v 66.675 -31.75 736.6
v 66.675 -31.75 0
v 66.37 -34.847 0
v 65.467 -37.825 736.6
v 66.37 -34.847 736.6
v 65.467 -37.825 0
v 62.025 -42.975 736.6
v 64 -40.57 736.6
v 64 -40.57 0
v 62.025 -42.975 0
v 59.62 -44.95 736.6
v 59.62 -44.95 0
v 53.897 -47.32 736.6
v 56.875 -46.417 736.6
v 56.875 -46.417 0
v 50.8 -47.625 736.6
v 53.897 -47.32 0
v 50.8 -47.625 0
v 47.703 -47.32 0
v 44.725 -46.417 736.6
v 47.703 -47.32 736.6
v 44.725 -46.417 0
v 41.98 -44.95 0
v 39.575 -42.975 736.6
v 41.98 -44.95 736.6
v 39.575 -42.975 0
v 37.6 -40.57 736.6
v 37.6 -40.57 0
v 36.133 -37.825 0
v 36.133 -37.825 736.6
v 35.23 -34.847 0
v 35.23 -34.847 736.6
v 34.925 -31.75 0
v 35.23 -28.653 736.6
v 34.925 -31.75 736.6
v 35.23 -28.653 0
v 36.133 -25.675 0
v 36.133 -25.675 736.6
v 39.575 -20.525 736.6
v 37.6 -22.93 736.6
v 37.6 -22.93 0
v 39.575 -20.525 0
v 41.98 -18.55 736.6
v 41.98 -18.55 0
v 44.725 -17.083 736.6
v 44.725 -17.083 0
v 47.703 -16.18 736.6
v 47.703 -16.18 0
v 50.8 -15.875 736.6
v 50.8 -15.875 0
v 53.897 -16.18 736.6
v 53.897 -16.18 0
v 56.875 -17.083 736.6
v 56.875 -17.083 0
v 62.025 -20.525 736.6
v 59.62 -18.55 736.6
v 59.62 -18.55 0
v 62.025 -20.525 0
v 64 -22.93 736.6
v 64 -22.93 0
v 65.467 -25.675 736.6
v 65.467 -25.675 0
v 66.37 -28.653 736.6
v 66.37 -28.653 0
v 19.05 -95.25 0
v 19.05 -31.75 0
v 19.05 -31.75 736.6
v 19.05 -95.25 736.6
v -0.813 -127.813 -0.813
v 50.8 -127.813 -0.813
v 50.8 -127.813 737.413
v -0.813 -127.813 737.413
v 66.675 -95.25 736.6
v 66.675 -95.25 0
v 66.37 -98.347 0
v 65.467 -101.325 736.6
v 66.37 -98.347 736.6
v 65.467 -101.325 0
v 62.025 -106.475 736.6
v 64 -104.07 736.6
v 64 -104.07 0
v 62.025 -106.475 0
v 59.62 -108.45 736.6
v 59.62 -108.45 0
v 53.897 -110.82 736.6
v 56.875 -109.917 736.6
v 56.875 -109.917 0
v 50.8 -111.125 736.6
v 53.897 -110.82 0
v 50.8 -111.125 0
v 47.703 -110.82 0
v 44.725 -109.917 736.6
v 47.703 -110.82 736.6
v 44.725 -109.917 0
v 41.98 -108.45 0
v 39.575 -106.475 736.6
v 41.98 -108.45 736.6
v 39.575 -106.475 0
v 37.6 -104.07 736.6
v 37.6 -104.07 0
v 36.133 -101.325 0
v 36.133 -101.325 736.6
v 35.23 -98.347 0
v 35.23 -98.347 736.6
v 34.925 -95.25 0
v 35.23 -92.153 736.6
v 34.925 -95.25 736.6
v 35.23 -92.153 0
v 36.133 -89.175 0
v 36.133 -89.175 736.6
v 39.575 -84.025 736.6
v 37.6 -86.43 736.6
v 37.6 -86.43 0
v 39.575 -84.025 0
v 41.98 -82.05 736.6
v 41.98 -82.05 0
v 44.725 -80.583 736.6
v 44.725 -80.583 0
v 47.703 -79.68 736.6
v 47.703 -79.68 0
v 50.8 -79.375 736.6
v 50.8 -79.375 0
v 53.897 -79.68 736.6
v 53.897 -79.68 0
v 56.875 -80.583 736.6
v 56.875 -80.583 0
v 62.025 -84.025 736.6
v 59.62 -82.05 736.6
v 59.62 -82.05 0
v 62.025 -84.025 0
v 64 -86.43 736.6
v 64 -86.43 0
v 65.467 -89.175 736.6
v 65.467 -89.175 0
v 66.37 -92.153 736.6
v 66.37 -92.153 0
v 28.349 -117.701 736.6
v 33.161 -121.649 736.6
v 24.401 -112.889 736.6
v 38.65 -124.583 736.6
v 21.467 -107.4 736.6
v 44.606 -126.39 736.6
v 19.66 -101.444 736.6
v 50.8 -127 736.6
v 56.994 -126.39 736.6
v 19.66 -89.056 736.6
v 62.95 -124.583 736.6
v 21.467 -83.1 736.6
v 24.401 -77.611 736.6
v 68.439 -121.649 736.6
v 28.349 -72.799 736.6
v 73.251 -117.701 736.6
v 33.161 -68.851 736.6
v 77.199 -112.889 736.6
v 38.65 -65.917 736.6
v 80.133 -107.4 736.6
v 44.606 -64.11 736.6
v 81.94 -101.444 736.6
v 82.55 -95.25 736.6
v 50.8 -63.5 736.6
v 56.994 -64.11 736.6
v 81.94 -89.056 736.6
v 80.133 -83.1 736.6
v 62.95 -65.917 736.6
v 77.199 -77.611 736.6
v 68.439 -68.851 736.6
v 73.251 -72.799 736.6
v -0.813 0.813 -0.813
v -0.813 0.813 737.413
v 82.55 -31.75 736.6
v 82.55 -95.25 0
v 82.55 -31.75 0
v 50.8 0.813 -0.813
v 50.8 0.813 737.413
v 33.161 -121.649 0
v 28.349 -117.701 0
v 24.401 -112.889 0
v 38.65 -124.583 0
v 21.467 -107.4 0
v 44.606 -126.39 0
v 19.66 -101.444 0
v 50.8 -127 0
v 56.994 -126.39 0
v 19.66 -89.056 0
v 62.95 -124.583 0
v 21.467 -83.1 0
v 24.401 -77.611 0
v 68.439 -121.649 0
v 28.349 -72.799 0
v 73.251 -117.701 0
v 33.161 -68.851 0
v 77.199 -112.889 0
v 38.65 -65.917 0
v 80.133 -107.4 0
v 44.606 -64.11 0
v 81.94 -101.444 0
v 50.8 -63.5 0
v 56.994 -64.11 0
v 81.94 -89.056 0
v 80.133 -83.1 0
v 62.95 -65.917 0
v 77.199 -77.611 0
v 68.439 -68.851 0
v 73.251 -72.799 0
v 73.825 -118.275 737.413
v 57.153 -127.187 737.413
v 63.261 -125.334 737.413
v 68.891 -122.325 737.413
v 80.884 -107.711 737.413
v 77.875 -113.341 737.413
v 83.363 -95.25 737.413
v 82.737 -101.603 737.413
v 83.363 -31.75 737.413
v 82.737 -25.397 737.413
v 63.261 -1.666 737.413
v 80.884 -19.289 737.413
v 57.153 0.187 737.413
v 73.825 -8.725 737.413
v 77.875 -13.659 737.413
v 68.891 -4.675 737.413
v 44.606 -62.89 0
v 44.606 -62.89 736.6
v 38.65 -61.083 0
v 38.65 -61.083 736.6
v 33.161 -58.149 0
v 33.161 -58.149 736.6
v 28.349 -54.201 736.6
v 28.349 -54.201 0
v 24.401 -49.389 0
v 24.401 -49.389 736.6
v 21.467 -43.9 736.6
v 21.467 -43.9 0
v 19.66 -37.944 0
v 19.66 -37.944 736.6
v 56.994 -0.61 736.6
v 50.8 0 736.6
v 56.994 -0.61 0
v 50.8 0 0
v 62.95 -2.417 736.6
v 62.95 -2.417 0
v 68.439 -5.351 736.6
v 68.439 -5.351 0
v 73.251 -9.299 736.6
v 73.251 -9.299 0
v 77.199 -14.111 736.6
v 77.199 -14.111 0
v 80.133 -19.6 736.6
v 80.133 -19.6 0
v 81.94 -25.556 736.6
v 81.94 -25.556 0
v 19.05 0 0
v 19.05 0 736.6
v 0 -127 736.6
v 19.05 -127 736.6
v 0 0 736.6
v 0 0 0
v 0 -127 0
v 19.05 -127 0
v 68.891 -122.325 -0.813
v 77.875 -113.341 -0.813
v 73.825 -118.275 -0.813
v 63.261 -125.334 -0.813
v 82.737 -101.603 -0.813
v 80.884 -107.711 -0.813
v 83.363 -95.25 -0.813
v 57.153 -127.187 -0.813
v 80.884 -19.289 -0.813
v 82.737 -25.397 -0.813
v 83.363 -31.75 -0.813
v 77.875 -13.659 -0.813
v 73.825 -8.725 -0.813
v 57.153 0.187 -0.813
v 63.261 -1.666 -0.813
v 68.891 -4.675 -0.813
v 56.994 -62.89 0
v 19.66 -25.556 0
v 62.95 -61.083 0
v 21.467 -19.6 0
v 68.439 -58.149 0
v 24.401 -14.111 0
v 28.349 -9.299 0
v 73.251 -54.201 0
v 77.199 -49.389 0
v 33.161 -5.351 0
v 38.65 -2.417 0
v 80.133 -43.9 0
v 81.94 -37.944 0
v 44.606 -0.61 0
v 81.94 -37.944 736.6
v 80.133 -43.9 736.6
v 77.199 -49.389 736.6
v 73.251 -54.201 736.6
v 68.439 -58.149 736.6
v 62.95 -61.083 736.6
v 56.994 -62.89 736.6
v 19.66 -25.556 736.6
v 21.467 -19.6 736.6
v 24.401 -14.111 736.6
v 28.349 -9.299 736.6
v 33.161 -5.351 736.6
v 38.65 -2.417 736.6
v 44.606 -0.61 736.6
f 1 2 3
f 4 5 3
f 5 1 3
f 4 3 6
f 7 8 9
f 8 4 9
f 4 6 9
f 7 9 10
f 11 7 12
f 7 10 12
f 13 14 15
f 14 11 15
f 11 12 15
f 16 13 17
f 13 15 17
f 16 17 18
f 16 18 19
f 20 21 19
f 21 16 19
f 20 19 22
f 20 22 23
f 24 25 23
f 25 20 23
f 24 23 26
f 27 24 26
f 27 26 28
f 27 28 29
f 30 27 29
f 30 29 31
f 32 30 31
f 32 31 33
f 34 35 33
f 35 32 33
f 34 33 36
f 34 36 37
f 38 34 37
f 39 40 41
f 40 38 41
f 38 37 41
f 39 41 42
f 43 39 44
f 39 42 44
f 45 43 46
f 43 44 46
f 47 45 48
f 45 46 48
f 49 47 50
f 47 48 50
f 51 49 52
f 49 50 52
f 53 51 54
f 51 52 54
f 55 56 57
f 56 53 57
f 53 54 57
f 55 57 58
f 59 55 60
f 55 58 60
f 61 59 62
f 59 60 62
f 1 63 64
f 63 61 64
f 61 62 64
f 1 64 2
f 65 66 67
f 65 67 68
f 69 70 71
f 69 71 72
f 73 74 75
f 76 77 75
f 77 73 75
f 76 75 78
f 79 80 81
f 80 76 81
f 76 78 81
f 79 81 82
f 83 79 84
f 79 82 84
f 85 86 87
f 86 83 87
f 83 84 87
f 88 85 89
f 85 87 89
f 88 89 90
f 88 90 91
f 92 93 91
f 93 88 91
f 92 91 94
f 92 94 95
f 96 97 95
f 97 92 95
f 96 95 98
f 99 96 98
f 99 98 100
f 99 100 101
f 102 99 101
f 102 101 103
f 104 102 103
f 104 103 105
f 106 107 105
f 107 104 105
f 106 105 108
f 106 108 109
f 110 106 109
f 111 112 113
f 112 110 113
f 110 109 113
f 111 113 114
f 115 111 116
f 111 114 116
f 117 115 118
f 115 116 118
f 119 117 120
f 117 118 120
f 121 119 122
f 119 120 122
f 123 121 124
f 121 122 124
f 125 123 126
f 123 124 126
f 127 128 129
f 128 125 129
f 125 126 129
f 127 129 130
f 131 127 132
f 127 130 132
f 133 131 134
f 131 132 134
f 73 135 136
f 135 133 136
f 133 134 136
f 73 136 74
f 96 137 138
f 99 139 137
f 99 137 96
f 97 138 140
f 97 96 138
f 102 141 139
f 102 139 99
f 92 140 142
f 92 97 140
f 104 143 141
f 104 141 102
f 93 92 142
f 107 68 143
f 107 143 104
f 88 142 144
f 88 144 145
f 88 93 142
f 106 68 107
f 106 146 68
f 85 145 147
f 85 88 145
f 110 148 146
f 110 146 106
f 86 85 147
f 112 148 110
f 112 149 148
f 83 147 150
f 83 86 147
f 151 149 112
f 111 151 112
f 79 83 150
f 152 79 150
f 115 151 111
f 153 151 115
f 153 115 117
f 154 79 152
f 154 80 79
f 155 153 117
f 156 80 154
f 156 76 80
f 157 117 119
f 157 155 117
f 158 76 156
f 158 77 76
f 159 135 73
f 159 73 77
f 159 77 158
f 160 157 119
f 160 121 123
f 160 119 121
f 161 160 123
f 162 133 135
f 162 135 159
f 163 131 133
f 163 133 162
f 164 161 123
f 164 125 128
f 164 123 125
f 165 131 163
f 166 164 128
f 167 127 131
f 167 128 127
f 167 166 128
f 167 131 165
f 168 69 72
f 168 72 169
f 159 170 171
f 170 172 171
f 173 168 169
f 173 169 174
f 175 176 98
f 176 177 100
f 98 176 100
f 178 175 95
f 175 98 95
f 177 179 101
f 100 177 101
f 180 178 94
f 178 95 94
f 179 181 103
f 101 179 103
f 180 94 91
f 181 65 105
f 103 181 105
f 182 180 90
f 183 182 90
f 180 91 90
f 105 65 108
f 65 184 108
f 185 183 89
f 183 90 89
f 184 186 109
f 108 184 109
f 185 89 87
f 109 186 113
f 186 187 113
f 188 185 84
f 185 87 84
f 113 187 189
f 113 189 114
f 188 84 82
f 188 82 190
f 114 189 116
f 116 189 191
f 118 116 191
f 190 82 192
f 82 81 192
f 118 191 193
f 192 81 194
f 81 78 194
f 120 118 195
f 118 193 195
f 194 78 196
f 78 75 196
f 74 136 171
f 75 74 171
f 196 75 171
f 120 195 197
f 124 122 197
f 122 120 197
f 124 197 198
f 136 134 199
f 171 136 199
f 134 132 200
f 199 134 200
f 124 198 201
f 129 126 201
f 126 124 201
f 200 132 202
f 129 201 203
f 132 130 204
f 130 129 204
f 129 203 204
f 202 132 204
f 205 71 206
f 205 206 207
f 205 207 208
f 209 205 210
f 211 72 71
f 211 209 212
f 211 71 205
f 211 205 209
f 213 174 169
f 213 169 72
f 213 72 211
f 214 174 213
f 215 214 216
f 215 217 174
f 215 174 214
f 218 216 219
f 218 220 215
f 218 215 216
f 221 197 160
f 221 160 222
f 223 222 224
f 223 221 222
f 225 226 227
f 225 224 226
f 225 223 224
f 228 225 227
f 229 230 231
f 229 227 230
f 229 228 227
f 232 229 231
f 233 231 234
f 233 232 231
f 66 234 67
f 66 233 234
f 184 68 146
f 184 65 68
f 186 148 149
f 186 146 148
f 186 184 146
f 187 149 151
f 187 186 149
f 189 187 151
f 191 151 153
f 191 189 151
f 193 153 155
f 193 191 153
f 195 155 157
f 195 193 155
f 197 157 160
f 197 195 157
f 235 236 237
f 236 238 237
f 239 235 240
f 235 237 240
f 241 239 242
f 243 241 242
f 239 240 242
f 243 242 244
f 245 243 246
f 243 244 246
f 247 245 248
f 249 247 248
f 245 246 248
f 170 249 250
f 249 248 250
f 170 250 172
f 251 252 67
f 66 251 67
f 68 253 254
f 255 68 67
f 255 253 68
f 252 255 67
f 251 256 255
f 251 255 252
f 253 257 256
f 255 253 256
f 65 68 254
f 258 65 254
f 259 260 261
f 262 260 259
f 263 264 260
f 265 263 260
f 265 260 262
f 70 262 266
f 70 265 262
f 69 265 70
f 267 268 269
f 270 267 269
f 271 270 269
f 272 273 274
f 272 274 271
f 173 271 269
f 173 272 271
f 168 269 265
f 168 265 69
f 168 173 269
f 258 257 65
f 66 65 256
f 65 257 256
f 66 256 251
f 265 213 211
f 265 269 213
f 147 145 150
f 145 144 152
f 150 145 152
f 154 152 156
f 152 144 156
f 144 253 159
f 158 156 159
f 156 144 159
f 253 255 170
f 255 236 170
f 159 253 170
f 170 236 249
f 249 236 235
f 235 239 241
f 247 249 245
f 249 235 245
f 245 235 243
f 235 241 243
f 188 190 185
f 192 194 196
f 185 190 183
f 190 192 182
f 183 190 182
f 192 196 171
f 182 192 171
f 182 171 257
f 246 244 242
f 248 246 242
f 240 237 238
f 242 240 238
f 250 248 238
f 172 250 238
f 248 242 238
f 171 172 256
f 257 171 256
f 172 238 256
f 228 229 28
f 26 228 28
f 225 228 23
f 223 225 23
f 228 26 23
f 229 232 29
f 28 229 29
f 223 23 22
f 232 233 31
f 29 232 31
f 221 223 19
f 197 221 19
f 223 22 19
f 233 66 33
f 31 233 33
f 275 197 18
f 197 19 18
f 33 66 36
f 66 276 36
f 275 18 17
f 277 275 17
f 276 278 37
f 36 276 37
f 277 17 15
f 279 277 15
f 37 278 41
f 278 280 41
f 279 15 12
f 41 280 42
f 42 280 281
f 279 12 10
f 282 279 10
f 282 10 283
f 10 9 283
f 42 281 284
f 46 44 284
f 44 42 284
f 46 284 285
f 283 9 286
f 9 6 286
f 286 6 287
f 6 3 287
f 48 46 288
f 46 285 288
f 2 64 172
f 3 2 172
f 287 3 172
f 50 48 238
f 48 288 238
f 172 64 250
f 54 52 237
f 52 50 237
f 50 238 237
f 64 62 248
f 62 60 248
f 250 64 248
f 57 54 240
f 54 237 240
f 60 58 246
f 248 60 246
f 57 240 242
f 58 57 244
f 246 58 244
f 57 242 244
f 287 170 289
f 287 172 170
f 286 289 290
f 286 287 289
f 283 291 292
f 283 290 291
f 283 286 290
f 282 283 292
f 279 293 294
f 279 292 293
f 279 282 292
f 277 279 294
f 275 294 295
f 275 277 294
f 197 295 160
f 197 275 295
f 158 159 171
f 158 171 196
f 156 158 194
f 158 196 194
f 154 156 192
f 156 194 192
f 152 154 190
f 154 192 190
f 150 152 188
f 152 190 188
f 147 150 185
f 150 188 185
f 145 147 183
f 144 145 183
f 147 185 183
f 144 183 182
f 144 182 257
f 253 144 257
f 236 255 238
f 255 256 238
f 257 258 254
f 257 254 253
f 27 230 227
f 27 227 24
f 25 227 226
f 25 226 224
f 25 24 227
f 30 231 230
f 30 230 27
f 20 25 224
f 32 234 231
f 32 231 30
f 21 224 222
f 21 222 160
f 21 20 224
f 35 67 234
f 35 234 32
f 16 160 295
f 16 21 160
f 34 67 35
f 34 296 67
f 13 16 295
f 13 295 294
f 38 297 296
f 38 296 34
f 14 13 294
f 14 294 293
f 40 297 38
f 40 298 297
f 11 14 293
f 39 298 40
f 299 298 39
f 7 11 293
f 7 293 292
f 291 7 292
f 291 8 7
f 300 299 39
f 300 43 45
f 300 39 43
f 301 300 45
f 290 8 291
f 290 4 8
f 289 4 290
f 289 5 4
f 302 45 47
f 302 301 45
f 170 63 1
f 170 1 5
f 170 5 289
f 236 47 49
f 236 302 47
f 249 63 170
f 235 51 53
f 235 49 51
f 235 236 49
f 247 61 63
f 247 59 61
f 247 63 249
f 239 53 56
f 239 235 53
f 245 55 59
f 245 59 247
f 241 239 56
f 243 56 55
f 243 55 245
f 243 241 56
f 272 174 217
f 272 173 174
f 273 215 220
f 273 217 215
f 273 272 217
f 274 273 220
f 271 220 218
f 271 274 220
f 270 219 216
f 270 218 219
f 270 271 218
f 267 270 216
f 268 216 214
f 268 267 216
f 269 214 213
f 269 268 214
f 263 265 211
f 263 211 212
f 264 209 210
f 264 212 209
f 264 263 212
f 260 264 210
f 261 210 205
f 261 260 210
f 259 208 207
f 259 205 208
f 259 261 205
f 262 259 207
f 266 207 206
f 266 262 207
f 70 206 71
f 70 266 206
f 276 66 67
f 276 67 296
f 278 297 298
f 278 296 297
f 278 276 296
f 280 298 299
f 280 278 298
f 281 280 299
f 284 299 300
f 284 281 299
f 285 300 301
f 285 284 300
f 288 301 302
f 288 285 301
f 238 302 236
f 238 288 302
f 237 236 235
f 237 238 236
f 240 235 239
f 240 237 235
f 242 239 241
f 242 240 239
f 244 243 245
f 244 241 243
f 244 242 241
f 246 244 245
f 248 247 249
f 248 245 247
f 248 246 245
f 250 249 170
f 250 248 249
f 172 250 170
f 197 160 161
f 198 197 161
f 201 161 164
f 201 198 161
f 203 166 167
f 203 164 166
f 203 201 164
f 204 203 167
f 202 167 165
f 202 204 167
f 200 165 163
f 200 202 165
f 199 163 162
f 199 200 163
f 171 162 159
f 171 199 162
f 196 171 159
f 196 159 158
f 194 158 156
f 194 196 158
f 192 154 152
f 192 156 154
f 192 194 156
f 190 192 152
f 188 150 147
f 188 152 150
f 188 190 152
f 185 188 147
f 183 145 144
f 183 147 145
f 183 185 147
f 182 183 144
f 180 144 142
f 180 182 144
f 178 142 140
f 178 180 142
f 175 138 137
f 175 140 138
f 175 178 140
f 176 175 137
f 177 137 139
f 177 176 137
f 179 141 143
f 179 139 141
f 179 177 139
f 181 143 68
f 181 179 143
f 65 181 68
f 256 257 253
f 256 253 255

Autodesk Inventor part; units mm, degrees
ref_plane "YZ Plane" through (0, 0, 0) normal (1, 0, 0) x (0, 1, 0)
ref_plane "XZ Plane" through (0, 0, 0) normal (0, 1, 0) x (-1, 0, 0)
ref_plane "XY Plane" through (0, 0, 0) normal (0, 0, 1) x (1, 0, 0)
sketch "Sketch1" plane through (0, 0, 0) normal (0, 0, 1) x (1, 0, 0)
  line L0 (0, 0) -> (19.05, 0)
  line L1 (19.05, 0) -> (19.05, -127)
  line L2 (19.05, -127) -> (0, -127)
  line L3 (0, -127) -> (0, 0)
  circle A0 centre (50.8, -31.75) radius 31.75
  circle A1 centre (50.8, -31.75) radius 15.875
  circle A2 centre (50.8, -95.25) radius 15.875
  circle A3 centre (50.8, -95.25) radius 31.75
  dimension "d0" = 19.05
  dimension "d1" = 127
  dimension "d2" = 31.75
extrude "Extrusion1" add sketch "Sketch1" along normal blind 736.6 contours L0 L1 L2 L3
extrude "Extrusion2" add sketch "Sketch1" along normal up to surface (736.6 mm away) separate body contours A0 | A3
sketch "Sketch2" plane through (0, 0, 0) normal (0, 0, -1) x (-1, 0, 0)
  line L0 (-19.05, -127) -> (0, -127) projected
  line L1 (0, -127) -> (0, 0) projected
  line L2 (0, 0) -> (-50.8, 0)
  circle A0 centre (-50.8, -31.75) radius 31.75 projected
  line L3 (0, 0) -> (0, -127) projected
  line L4 (0, 0) -> (0, -127)
  line L5 (0, -127) -> (-50.8, -127)
  circle A1 centre (-50.8, -95.25) radius 31.75 projected
  arc A2 (-82.55, -95.25) -> (-50.8, -127) centre (-50.8, -95.25) ccw
  arc A3 (-50.8, 0) -> (-82.55, -31.75) centre (-50.8, -31.75) ccw
  line L6 (-82.55, -31.75) -> (-82.55, -95.25)
  arc A4 (-83.3628, -95.25) -> (-50.8, -127.8128) centre (-50.8, -95.25) ccw
  line L7 (-50.8, -127.8128) -> (0.8128, -127.8128)
  line L8 (0.8128, -127.8128) -> (0.8128, 0.8128)
  line L9 (0.8128, 0.8128) -> (-50.8, 0.8128)
  arc A5 (-50.8, 0.8128) -> (-83.3628, -31.75) centre (-50.8, -31.75) ccw
  line L10 (-83.3628, -31.75) -> (-83.3628, -95.25)
  point P0 (-50.8, -63.5)
  dimension "d7" = 0.8128
extrude "Extrusion3" add sketch "Sketch2" against normal up to surface (736.6 mm away) separate body
sketch "Sketch3" plane through (0, 0, 0) normal (0, 0, -1) x (-1, 0, 0)
  arc A0 (-83.3628, -95.25) -> (-50.8, -127.8128) centre (-50.8, -95.25) ccw projected
  line L0 (-50.8, -127.8128) -> (0.8128, -127.8128) projected
  line L1 (0.8128, -127.8128) -> (0.8128, 0.8128) projected
  line L2 (0.8128, 0.8128) -> (-50.8, 0.8128) projected
  arc A1 (-50.8, 0.8128) -> (-83.3628, -31.75) centre (-50.8, -31.75) ccw projected
  line L3 (-83.3628, -31.75) -> (-83.3628, -95.25) projected
extrude "Extrusion4" add sketch "Sketch3" along normal blind 0.8128 bodies 3
sketch "Sketch5" plane through (-0.8128, -127.8128, 736.6) normal (0, 0, 1) x (1, 0, 0)
  line L0 (51.6128, 0) -> (0, 0) projected
  arc A0 (51.6128, 0) -> (84.1756, 32.5628) centre (51.6128, 32.5628) ccw projected
  line L1 (84.1756, 96.0628) -> (84.1756, 32.5628) projected
  arc A1 (84.1756, 96.0628) -> (51.6128, 128.6256) centre (51.6128, 96.0628) ccw projected
  line L2 (0, 128.6256) -> (51.6128, 128.6256) projected
  line L3 (0, 0) -> (0, 128.6256) projected
extrude "Extrusion5" add sketch "Sketch5" along normal blind 0.8128 bodies 3
sketch "Sketch6" plane through (83.3628, -95.25, -0.8128) normal (1, 0, 0) x (0, 0, -1)
  line L0 (-451.4685, 85.5931) -> (-297.7504, 85.5931) construction
  line L1 (-297.7504, 85.5931) -> (-297.7504, -15.869) construction
  line L2 (-297.7504, -15.869) -> (-451.4685, -15.869) construction
  line L3 (-451.4685, -15.869) -> (-451.4685, 85.5931) construction
  point P0 (-0.8128, 95.25)
decal "Decal1"
properties part number "SideBumper" material "Wood (Birch)"
